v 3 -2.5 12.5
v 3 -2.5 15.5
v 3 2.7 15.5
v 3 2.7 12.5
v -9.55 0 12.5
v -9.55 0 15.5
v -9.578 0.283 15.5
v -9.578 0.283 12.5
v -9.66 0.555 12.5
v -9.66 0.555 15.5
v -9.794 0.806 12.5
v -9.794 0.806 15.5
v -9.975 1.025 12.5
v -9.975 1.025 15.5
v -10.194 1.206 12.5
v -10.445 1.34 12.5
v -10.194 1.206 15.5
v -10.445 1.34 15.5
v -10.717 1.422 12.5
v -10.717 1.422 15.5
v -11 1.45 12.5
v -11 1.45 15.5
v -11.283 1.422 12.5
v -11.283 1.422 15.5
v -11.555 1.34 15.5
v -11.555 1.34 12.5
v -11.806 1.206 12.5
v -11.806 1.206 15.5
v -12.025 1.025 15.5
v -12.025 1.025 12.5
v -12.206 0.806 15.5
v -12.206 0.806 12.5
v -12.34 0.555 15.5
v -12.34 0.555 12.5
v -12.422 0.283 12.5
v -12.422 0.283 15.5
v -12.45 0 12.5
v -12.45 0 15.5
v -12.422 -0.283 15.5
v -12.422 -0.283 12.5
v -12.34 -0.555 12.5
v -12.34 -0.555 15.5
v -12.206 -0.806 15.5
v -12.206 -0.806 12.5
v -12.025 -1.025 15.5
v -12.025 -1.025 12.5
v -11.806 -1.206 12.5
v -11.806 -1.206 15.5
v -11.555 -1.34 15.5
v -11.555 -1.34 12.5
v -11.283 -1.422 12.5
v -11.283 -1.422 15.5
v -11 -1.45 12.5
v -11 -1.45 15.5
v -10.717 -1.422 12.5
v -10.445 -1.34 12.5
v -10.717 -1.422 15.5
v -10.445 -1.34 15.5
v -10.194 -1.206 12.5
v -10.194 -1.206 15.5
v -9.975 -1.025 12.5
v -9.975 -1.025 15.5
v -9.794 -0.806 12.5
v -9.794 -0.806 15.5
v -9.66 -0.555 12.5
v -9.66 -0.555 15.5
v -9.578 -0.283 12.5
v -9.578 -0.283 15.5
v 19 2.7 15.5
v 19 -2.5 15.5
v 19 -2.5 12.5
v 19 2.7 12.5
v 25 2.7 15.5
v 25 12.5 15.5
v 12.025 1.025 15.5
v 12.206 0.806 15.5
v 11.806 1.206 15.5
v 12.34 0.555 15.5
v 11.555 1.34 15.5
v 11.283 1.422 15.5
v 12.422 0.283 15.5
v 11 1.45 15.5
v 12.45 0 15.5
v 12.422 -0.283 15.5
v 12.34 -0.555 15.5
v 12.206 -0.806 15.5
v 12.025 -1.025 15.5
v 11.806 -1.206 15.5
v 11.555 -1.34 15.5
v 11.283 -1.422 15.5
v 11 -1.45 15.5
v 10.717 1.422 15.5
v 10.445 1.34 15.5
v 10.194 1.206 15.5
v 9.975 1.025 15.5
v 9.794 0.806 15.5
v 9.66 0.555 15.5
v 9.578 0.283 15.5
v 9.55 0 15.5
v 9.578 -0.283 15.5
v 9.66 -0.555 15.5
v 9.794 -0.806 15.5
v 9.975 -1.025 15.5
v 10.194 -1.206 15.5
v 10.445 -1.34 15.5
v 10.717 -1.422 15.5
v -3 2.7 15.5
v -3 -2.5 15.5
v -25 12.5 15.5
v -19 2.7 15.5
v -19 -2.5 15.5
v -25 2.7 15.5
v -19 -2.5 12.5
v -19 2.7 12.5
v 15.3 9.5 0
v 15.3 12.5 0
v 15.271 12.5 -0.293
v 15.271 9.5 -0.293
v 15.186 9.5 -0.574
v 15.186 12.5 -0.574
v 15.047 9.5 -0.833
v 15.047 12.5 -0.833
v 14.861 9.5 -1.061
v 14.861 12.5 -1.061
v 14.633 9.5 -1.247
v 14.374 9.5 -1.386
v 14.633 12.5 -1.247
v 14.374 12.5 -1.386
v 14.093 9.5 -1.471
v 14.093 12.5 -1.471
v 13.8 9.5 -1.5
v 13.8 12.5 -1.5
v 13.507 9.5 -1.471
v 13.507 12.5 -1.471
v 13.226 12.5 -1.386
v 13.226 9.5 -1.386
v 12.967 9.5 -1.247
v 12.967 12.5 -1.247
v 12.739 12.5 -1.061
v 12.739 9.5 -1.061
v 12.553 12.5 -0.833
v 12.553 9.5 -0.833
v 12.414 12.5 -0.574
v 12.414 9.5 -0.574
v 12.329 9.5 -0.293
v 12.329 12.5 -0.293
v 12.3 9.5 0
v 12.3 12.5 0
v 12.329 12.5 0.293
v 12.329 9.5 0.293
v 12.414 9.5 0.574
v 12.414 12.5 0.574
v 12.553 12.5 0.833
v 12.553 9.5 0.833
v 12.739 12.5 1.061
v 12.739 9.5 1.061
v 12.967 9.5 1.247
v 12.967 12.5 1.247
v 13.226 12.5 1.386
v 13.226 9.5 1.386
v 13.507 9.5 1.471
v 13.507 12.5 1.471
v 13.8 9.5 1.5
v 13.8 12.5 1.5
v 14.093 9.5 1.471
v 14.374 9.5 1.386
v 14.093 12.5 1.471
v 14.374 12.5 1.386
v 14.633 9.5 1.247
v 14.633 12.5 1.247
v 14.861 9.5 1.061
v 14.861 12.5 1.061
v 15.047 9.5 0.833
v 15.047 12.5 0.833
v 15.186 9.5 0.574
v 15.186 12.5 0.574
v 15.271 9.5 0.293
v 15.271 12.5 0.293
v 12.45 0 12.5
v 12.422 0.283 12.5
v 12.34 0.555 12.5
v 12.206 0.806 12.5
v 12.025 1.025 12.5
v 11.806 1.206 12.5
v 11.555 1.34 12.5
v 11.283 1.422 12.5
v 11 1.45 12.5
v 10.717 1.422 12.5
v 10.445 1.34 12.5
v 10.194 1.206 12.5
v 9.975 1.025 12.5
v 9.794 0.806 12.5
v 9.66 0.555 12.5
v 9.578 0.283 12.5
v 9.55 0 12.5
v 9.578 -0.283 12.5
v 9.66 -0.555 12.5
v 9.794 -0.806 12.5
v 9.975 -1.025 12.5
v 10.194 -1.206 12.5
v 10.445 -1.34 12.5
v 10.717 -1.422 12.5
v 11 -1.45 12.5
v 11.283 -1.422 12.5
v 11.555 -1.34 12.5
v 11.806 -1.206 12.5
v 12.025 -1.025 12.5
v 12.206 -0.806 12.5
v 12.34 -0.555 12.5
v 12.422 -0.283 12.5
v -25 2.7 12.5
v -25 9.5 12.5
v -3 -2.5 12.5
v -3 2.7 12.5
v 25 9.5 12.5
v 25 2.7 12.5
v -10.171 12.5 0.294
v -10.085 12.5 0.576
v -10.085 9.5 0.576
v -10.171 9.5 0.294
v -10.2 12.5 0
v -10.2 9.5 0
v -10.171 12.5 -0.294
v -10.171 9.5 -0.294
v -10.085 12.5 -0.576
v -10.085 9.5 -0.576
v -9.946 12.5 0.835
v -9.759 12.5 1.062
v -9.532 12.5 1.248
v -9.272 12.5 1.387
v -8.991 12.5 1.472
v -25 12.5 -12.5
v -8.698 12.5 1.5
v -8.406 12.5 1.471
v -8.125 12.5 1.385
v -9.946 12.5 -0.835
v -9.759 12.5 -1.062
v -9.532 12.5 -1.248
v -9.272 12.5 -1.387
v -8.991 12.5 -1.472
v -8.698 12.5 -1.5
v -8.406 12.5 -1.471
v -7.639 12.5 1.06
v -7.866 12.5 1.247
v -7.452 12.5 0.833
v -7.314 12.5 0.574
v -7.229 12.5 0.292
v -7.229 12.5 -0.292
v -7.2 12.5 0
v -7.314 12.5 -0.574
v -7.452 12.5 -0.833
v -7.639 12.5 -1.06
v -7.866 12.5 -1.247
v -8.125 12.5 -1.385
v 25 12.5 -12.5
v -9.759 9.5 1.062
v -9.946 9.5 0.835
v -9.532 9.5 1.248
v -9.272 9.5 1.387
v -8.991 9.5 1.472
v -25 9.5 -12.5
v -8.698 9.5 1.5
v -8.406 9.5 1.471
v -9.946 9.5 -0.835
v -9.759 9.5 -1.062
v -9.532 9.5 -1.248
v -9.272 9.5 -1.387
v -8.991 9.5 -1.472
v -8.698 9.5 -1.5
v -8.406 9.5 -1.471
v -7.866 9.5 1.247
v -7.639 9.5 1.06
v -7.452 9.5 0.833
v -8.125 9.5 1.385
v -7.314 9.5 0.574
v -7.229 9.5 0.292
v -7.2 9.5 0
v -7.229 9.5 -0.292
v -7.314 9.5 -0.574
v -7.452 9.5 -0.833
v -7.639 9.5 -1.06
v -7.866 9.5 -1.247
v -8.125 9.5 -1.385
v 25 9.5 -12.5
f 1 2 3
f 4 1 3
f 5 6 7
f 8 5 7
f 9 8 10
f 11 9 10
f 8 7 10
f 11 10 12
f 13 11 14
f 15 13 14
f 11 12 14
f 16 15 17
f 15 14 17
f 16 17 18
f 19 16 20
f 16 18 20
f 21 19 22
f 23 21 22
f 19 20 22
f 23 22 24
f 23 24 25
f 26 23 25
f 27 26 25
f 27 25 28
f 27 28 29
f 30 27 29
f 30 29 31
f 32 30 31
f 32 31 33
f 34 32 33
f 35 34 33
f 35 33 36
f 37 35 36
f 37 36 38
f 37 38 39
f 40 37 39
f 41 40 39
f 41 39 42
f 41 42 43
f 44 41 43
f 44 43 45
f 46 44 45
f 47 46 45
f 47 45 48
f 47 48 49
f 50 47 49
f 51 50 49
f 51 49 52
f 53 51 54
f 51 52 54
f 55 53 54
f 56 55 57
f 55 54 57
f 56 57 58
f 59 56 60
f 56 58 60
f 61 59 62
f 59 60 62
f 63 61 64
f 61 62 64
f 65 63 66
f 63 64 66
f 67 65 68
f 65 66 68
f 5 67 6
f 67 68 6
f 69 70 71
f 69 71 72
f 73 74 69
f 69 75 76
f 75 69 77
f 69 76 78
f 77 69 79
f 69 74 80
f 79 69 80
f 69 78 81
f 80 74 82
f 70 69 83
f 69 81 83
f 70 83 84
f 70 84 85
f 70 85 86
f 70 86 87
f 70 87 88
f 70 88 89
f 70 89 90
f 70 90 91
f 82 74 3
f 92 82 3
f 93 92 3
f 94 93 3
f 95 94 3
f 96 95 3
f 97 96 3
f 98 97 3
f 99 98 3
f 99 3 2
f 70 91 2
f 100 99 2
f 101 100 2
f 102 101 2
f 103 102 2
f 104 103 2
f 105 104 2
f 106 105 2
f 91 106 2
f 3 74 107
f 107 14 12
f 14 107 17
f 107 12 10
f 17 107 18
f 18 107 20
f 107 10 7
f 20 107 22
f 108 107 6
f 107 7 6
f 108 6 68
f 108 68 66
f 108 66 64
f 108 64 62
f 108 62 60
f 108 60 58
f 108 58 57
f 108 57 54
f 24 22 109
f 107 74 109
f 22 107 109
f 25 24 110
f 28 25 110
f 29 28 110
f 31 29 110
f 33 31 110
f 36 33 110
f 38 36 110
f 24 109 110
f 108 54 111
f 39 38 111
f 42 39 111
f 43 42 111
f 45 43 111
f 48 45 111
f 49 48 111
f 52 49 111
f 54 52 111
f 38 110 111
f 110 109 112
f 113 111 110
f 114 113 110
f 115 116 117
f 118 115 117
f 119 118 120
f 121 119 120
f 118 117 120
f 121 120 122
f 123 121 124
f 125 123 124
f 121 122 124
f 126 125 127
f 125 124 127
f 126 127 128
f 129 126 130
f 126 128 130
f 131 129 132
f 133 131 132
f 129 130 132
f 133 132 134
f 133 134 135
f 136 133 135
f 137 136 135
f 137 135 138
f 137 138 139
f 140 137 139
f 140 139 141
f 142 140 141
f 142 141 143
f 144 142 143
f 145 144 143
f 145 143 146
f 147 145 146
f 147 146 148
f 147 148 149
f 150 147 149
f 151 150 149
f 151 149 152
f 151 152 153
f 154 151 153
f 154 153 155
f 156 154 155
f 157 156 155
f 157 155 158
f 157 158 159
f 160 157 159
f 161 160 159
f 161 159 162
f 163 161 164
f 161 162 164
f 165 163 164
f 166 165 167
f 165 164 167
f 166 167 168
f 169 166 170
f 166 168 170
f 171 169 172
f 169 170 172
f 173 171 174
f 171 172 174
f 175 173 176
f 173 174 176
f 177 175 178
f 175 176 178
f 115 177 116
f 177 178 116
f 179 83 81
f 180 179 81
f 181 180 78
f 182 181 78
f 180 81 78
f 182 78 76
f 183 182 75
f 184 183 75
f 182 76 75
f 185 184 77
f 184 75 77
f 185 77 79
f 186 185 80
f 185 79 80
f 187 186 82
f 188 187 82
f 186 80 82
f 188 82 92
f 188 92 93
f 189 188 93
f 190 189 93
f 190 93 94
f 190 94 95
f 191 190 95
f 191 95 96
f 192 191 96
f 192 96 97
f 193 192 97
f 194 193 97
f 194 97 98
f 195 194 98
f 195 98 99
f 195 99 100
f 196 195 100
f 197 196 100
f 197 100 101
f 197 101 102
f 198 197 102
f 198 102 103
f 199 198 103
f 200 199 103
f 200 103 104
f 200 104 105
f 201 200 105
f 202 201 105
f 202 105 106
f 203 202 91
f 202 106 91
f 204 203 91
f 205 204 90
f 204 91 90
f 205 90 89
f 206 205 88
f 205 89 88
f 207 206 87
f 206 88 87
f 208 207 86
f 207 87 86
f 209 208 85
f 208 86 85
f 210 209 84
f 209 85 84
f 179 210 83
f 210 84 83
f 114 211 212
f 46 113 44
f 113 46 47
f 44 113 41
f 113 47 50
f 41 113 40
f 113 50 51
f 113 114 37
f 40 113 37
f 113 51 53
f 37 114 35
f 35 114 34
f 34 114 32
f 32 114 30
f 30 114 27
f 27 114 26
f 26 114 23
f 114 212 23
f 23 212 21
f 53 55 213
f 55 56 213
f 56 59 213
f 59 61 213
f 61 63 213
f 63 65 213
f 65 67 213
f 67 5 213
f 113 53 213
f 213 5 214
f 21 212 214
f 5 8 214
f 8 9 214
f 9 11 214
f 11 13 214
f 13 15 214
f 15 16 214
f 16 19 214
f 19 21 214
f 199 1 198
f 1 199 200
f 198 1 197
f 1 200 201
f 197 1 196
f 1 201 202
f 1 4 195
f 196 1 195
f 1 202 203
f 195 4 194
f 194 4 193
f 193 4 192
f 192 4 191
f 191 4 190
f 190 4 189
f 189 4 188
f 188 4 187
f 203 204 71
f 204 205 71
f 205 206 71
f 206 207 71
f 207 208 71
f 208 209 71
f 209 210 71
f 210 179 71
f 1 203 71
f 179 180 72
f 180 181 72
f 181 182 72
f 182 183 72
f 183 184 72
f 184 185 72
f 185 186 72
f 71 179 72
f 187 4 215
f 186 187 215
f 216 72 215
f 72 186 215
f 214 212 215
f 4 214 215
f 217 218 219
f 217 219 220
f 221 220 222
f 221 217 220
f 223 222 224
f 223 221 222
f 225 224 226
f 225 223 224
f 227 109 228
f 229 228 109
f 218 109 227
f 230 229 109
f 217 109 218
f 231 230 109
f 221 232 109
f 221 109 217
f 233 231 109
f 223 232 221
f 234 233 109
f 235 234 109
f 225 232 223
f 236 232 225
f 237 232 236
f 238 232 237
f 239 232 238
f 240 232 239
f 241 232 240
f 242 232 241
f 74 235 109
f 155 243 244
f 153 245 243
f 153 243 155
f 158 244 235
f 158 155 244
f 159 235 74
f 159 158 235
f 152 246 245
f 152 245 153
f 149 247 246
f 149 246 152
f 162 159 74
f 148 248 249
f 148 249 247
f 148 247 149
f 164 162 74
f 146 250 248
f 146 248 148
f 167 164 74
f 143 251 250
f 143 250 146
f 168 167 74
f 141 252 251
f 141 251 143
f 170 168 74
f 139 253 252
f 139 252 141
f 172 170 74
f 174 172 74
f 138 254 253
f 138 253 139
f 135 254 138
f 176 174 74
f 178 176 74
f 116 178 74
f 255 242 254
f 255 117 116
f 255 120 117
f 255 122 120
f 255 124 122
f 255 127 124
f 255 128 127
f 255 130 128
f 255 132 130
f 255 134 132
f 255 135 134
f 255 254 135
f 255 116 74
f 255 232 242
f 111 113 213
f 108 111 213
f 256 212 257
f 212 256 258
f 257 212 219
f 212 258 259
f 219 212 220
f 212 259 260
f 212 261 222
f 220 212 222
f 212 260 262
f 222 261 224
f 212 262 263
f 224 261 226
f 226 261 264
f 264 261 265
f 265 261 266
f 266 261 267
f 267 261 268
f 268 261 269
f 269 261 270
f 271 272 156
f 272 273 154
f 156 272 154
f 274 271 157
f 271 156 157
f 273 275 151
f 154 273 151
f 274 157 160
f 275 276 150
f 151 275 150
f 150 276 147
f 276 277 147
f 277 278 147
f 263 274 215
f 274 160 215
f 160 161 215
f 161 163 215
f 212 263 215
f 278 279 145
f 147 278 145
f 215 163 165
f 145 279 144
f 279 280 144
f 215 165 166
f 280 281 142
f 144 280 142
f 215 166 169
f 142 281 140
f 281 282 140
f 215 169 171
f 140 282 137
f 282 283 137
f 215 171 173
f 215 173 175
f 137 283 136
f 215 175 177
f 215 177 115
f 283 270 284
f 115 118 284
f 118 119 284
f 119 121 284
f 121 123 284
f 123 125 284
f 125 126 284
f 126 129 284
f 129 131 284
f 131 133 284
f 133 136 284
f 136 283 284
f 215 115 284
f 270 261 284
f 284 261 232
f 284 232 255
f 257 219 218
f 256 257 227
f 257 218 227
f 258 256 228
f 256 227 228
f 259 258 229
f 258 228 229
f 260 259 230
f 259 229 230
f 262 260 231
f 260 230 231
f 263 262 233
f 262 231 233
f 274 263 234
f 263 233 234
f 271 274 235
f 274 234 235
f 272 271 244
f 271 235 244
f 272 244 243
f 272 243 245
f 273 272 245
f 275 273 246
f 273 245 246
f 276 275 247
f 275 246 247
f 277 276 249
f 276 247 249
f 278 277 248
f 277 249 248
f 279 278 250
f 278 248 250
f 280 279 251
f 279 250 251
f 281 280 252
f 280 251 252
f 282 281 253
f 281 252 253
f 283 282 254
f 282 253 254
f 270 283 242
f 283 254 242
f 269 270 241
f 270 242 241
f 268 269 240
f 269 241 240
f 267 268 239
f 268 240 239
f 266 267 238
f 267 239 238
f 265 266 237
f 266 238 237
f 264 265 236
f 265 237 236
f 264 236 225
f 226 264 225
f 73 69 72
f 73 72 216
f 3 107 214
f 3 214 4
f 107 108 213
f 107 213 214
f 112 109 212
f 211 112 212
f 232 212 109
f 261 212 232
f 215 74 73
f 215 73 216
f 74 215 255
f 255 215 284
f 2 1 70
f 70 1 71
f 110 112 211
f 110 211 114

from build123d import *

# Parameters (mm, degrees)
SKETCH1_W                = 50
SKETCH1_H                = 25
SKETCH1_R                = 1.3
SKETCH1_R_2              = 4.5
BOSS_EXTRUDE1_DEPTH      = 2.5
SKETCH2_W                = 50
SKETCH2_H                = 12
BOSS_EXTRUDE2_DEPTH      = 3
SKETCH3_W                = 50
SKETCH3_H                = 28
BOSS_EXTRUDE3_DEPTH      = 3
SKETCH4_R                = 1.3
CUT_EXTRUDE1_DEPTH       = 16
SKETCH5_W                = 53
SKETCH5_H                = 32.5
SKETCH5_R                = 1.6
SKETCH5_W_2              = 42
SKETCH5_H_2              = 21.5
BOSS_EXTRUDE4_DEPTH      = 4
SKETCH7_R                = 8
CUT_EXTRUDE2_DEPTH       = 5
SKETCH8_W                = 24.55
SKETCH8_H                = 21.5
CUT_EXTRUDE3_DEPTH       = 3.8
BOSS_EXTRUDE6_DEPTH      = 22.95
BOSS_EXTRUDE7_DEPTH      = 2
SKETCH11_R               = 1.6
CUT_EXTRUDE4_DEPTH       = 1.2
SKETCH12_W               = 7
SKETCH12_H               = 21
SKETCH12_R               = 1.6
BOSS_EXTRUDE8_DEPTH      = 7.8
SKETCH13_W               = 0.7
SKETCH13_H               = 5
SKETCH13_H_2             = 4
CUT_EXTRUDE5_DEPTH       = 51
CUT_EXTRUDE5_DEPTH_BACK  = 25.95
SKETCH14_W               = 3
SKETCH14_H               = 4
SKETCH14_W_2             = 25
SKETCH14_H_2             = 5
CUT_EXTRUDE6_DEPTH       = 1
CUT_EXTRUDE6_DEPTH_BACK  = 75.95
SKETCH15_W               = 24.95
SKETCH15_H               = 3
CUT_EXTRUDE7_DEPTH       = 11
CUT_EXTRUDE7_DEPTH_BACK  = 6
SKETCH16_R               = 1.45
SKETCH16_W               = 6
SKETCH16_H               = 5.2
CUT_EXTRUDE8_DEPTH       = 1
CUT_EXTRUDE8_DEPTH_BACK  = 29
SKETCH18_R               = 1.5
CUT_EXTRUDE9_DEPTH       = 1
CUT_EXTRUDE9_DEPTH_BACK  = 16
SKETCH19_R               = 1.3
BOSS_EXTRUDE9_DEPTH      = 3
SKETCH20_R               = 1.5
CUT_EXTRUDE10_DEPTH      = 1
CUT_EXTRUDE10_DEPTH_BACK = 16


with BuildPart() as part:
    # Sketch1 → Boss-Extrude1 (new body, symmetric)
    with BuildSketch(Plane(origin=(0, 0, 0), x_dir=(1, 0, 0), z_dir=(0, 1, 0))):
        Rectangle(SKETCH1_W, SKETCH1_H)
        with Locations((-11.25, 0)):
            Circle(SKETCH1_R, mode=Mode.SUBTRACT)
        with Locations((11.25, 0)):
            Circle(SKETCH1_R_2, mode=Mode.SUBTRACT)
    extrude(amount=BOSS_EXTRUDE1_DEPTH, both=True)

    # Sketch2 → Boss-Extrude2 (add)
    with BuildSketch(Plane.XY.offset(12.5)):
        with Locations((0, 3.5)):
            Rectangle(SKETCH2_W, SKETCH2_H)
    extrude(amount=BOSS_EXTRUDE2_DEPTH)

    # Sketch3 → Boss-Extrude3 (add)
    with BuildSketch(Plane(origin=(0, 9.5, 0), x_dir=(1, 0, 0), z_dir=(0, 1, 0))):
        with Locations((0, -1.5)):
            Rectangle(SKETCH3_W, SKETCH3_H)
    extrude(amount=BOSS_EXTRUDE3_DEPTH)

    # Sketch4 → Cut-Extrude1 (cut, through all)
    with BuildSketch(Plane(origin=(0, 12.5, 0), x_dir=(1, 0, 0), z_dir=(0, 1, 0))):
        with Locations((11.25, 0)):
            Circle(SKETCH4_R)
        with Locations((-11.25, 0)):
            Circle(SKETCH4_R)
    extrude(amount=-CUT_EXTRUDE1_DEPTH, mode=Mode.SUBTRACT)

    # Sketch5 → Boss-Extrude4 (add)
    with BuildSketch(Plane.XZ.offset(2.5)):
        with Locations((21.45, -0.05)):
            Rectangle(SKETCH5_W, SKETCH5_H)
        with Locations((45.75, -5)):
            Circle(SKETCH5_R, mode=Mode.SUBTRACT)
        with Locations((45.75, 4.9)):
            Circle(SKETCH5_R, mode=Mode.SUBTRACT)
        with Locations((-2.85, 4.9)):
            Circle(SKETCH5_R, mode=Mode.SUBTRACT)
        with Locations((-2.85, -5)):
            Circle(SKETCH5_R, mode=Mode.SUBTRACT)
        with Locations((21.45, -0.05)):
            Rectangle(SKETCH5_W_2, SKETCH5_H_2, mode=Mode.SUBTRACT)
    extrude(amount=BOSS_EXTRUDE4_DEPTH)

    # Sketch7 → Cut-Extrude2 (cut)
    with BuildSketch(Plane.XZ.offset(2.5)):
        with Locations((11.25, 0)):
            Circle(SKETCH7_R)
    extrude(amount=-CUT_EXTRUDE2_DEPTH, mode=Mode.SUBTRACT)

    # Sketch8 → Cut-Extrude3 (cut)
    with BuildSketch(Plane.XZ.offset(2.5)):
        with Locations((12.725, -0.05)):
            Rectangle(SKETCH8_W, SKETCH8_H)
    extrude(amount=-CUT_EXTRUDE3_DEPTH, mode=Mode.SUBTRACT)

    # Sketch9 → Boss-Extrude6 (add)
    with BuildSketch(Plane(origin=(25, 0, 0), x_dir=(0, 0, -1), z_dir=(1, 0, 0))):
        Polygon((12.5, 2.5), (-16.2, 2.5), (-16.2, -2.5), (-10.7, -2.5), (-10.7, 1.3), (10.8, 1.3), (10.8, -2.5), (12.5, -2.5), align=None)
    extrude(amount=BOSS_EXTRUDE6_DEPTH)

    # Sketch10 → Boss-Extrude7 (add)
    with BuildSketch(Plane(origin=(47.95, 0, 0), x_dir=(0, 0, -1), z_dir=(1, 0, 0))):
        Polygon((16.3, -2.5), (12.5, -2.5), (12.5, 2.5), (-16.2, 2.5), (-16.2, -6.5), (16.3, -6.5), align=None)
    extrude(amount=BOSS_EXTRUDE7_DEPTH)

    # Sketch11 → Cut-Extrude4 (cut)
    with BuildSketch(Plane.XZ.offset(-1.3)):
        with Locations((-2.85, 4.9)):
            Circle(SKETCH11_R)
        with Locations((-2.85, -5)):
            Circle(SKETCH11_R)
        with Locations((45.75, 4.9)):
            Circle(SKETCH11_R)
        with Locations((45.75, -5)):
            Circle(SKETCH11_R)
    extrude(amount=-CUT_EXTRUDE4_DEPTH, mode=Mode.SUBTRACT)

    # Sketch12 → Boss-Extrude8 (add)
    with BuildSketch(Plane.XZ.offset(-1.3)):
        with Locations((46.45, 0.2)):
            Rectangle(SKETCH12_W, SKETCH12_H)
        with Locations((45.75, 4.9)):
            Circle(SKETCH12_R, mode=Mode.SUBTRACT)
        with Locations((45.75, -5)):
            Circle(SKETCH12_R, mode=Mode.SUBTRACT)
    extrude(amount=BOSS_EXTRUDE8_DEPTH)

    # Sketch13 → Cut-Extrude5 (cut, two sides)
    with BuildSketch(Plane.ZY.offset(-25)) as cut_extrude5_sk:
        with Locations((15.85, 0)):
            Rectangle(SKETCH13_W, SKETCH13_H)
        with Locations((15.85, -4.5)):
            Rectangle(SKETCH13_W, SKETCH13_H_2)
    extrude(amount=CUT_EXTRUDE5_DEPTH, mode=Mode.SUBTRACT)
    extrude(cut_extrude5_sk.sketch, amount=-CUT_EXTRUDE5_DEPTH_BACK, mode=Mode.SUBTRACT)

    # Sketch14 → Cut-Extrude6 (cut, two sides)
    with BuildSketch(Plane.ZY.offset(25)) as cut_extrude6_sk:
        with Locations((14, -4.5)):
            Rectangle(SKETCH14_W, SKETCH14_H)
        Polygon((-16.3, 2.5), (-16.3, -6.5), (12.5, -6.5), (12.5, -2.5), (-12.5, -2.5), (-12.5, 2.5), align=None)
        Rectangle(SKETCH14_W_2, SKETCH14_H_2)
    extrude(amount=CUT_EXTRUDE6_DEPTH, mode=Mode.SUBTRACT)
    extrude(cut_extrude6_sk.sketch, amount=-CUT_EXTRUDE6_DEPTH_BACK, mode=Mode.SUBTRACT)

    # Sketch15 → Cut-Extrude7 (cut, two sides)
    with BuildSketch(Plane(origin=(0, 2.5, 0), x_dir=(1, 0, 0), z_dir=(0, 1, 0))) as cut_extrude7_sk:
        with Locations((37.475, -14)):
            Rectangle(SKETCH15_W, SKETCH15_H)
    extrude(amount=CUT_EXTRUDE7_DEPTH, mode=Mode.SUBTRACT)
    extrude(cut_extrude7_sk.sketch, amount=-CUT_EXTRUDE7_DEPTH_BACK, mode=Mode.SUBTRACT)

    # Sketch16 → Cut-Extrude8 (cut, two sides)
    with BuildSketch(Plane.XY.offset(15.5)) as cut_extrude8_sk:
        with Locations((-11, 0)):
            Circle(SKETCH16_R)
        with Locations((11, 0)):
            Circle(SKETCH16_R)
        with Locations((-22, 0.1)):
            Rectangle(SKETCH16_W, SKETCH16_H)
        with Locations((0, 0.1)):
            Rectangle(SKETCH16_W, SKETCH16_H)
        with Locations((22, 0.1)):
            Rectangle(SKETCH16_W, SKETCH16_H)
    extrude(amount=CUT_EXTRUDE8_DEPTH, mode=Mode.SUBTRACT)
    extrude(cut_extrude8_sk.sketch, amount=-CUT_EXTRUDE8_DEPTH_BACK, mode=Mode.SUBTRACT)

    # Sketch18 → Cut-Extrude9 (cut, two sides)
    with BuildSketch(Plane(origin=(0, 12.5, 0), x_dir=(1, 0, 0), z_dir=(0, 1, 0))) as cut_extrude9_sk:
        with Locations((-8.7, 0)):
            Circle(SKETCH18_R)
    extrude(amount=CUT_EXTRUDE9_DEPTH, mode=Mode.SUBTRACT)
    extrude(cut_extrude9_sk.sketch, amount=-CUT_EXTRUDE9_DEPTH_BACK, mode=Mode.SUBTRACT)

    # Sketch19 → Boss-Extrude9 (add)
    with BuildSketch(Plane(origin=(0, 12.5, 0), x_dir=(1, 0, 0), z_dir=(0, 1, 0))):
        with BuildLine():
            ThreePointArc((-10.084803922, -0.57647038), (-10.2, 0), (-10.084803922, 0.57647038))
            ThreePointArc((-10.084803922, 0.57647038), (-12.55, 0), (-10.084803922, -0.57647038))
        make_face()
        with Locations((11.25, 0)):
            Circle(SKETCH19_R)
    extrude(amount=-BOSS_EXTRUDE9_DEPTH)

    # Sketch20 → Cut-Extrude10 (cut, two sides)
    with BuildSketch(Plane(origin=(0, 12.5, 0), x_dir=(1, 0, 0), z_dir=(0, 1, 0))) as cut_extrude10_sk:
        with Locations((13.8, 0)):
            Circle(SKETCH20_R)
    extrude(amount=CUT_EXTRUDE10_DEPTH, mode=Mode.SUBTRACT)
    extrude(cut_extrude10_sk.sketch, amount=-CUT_EXTRUDE10_DEPTH_BACK, mode=Mode.SUBTRACT)


solid = part.part
